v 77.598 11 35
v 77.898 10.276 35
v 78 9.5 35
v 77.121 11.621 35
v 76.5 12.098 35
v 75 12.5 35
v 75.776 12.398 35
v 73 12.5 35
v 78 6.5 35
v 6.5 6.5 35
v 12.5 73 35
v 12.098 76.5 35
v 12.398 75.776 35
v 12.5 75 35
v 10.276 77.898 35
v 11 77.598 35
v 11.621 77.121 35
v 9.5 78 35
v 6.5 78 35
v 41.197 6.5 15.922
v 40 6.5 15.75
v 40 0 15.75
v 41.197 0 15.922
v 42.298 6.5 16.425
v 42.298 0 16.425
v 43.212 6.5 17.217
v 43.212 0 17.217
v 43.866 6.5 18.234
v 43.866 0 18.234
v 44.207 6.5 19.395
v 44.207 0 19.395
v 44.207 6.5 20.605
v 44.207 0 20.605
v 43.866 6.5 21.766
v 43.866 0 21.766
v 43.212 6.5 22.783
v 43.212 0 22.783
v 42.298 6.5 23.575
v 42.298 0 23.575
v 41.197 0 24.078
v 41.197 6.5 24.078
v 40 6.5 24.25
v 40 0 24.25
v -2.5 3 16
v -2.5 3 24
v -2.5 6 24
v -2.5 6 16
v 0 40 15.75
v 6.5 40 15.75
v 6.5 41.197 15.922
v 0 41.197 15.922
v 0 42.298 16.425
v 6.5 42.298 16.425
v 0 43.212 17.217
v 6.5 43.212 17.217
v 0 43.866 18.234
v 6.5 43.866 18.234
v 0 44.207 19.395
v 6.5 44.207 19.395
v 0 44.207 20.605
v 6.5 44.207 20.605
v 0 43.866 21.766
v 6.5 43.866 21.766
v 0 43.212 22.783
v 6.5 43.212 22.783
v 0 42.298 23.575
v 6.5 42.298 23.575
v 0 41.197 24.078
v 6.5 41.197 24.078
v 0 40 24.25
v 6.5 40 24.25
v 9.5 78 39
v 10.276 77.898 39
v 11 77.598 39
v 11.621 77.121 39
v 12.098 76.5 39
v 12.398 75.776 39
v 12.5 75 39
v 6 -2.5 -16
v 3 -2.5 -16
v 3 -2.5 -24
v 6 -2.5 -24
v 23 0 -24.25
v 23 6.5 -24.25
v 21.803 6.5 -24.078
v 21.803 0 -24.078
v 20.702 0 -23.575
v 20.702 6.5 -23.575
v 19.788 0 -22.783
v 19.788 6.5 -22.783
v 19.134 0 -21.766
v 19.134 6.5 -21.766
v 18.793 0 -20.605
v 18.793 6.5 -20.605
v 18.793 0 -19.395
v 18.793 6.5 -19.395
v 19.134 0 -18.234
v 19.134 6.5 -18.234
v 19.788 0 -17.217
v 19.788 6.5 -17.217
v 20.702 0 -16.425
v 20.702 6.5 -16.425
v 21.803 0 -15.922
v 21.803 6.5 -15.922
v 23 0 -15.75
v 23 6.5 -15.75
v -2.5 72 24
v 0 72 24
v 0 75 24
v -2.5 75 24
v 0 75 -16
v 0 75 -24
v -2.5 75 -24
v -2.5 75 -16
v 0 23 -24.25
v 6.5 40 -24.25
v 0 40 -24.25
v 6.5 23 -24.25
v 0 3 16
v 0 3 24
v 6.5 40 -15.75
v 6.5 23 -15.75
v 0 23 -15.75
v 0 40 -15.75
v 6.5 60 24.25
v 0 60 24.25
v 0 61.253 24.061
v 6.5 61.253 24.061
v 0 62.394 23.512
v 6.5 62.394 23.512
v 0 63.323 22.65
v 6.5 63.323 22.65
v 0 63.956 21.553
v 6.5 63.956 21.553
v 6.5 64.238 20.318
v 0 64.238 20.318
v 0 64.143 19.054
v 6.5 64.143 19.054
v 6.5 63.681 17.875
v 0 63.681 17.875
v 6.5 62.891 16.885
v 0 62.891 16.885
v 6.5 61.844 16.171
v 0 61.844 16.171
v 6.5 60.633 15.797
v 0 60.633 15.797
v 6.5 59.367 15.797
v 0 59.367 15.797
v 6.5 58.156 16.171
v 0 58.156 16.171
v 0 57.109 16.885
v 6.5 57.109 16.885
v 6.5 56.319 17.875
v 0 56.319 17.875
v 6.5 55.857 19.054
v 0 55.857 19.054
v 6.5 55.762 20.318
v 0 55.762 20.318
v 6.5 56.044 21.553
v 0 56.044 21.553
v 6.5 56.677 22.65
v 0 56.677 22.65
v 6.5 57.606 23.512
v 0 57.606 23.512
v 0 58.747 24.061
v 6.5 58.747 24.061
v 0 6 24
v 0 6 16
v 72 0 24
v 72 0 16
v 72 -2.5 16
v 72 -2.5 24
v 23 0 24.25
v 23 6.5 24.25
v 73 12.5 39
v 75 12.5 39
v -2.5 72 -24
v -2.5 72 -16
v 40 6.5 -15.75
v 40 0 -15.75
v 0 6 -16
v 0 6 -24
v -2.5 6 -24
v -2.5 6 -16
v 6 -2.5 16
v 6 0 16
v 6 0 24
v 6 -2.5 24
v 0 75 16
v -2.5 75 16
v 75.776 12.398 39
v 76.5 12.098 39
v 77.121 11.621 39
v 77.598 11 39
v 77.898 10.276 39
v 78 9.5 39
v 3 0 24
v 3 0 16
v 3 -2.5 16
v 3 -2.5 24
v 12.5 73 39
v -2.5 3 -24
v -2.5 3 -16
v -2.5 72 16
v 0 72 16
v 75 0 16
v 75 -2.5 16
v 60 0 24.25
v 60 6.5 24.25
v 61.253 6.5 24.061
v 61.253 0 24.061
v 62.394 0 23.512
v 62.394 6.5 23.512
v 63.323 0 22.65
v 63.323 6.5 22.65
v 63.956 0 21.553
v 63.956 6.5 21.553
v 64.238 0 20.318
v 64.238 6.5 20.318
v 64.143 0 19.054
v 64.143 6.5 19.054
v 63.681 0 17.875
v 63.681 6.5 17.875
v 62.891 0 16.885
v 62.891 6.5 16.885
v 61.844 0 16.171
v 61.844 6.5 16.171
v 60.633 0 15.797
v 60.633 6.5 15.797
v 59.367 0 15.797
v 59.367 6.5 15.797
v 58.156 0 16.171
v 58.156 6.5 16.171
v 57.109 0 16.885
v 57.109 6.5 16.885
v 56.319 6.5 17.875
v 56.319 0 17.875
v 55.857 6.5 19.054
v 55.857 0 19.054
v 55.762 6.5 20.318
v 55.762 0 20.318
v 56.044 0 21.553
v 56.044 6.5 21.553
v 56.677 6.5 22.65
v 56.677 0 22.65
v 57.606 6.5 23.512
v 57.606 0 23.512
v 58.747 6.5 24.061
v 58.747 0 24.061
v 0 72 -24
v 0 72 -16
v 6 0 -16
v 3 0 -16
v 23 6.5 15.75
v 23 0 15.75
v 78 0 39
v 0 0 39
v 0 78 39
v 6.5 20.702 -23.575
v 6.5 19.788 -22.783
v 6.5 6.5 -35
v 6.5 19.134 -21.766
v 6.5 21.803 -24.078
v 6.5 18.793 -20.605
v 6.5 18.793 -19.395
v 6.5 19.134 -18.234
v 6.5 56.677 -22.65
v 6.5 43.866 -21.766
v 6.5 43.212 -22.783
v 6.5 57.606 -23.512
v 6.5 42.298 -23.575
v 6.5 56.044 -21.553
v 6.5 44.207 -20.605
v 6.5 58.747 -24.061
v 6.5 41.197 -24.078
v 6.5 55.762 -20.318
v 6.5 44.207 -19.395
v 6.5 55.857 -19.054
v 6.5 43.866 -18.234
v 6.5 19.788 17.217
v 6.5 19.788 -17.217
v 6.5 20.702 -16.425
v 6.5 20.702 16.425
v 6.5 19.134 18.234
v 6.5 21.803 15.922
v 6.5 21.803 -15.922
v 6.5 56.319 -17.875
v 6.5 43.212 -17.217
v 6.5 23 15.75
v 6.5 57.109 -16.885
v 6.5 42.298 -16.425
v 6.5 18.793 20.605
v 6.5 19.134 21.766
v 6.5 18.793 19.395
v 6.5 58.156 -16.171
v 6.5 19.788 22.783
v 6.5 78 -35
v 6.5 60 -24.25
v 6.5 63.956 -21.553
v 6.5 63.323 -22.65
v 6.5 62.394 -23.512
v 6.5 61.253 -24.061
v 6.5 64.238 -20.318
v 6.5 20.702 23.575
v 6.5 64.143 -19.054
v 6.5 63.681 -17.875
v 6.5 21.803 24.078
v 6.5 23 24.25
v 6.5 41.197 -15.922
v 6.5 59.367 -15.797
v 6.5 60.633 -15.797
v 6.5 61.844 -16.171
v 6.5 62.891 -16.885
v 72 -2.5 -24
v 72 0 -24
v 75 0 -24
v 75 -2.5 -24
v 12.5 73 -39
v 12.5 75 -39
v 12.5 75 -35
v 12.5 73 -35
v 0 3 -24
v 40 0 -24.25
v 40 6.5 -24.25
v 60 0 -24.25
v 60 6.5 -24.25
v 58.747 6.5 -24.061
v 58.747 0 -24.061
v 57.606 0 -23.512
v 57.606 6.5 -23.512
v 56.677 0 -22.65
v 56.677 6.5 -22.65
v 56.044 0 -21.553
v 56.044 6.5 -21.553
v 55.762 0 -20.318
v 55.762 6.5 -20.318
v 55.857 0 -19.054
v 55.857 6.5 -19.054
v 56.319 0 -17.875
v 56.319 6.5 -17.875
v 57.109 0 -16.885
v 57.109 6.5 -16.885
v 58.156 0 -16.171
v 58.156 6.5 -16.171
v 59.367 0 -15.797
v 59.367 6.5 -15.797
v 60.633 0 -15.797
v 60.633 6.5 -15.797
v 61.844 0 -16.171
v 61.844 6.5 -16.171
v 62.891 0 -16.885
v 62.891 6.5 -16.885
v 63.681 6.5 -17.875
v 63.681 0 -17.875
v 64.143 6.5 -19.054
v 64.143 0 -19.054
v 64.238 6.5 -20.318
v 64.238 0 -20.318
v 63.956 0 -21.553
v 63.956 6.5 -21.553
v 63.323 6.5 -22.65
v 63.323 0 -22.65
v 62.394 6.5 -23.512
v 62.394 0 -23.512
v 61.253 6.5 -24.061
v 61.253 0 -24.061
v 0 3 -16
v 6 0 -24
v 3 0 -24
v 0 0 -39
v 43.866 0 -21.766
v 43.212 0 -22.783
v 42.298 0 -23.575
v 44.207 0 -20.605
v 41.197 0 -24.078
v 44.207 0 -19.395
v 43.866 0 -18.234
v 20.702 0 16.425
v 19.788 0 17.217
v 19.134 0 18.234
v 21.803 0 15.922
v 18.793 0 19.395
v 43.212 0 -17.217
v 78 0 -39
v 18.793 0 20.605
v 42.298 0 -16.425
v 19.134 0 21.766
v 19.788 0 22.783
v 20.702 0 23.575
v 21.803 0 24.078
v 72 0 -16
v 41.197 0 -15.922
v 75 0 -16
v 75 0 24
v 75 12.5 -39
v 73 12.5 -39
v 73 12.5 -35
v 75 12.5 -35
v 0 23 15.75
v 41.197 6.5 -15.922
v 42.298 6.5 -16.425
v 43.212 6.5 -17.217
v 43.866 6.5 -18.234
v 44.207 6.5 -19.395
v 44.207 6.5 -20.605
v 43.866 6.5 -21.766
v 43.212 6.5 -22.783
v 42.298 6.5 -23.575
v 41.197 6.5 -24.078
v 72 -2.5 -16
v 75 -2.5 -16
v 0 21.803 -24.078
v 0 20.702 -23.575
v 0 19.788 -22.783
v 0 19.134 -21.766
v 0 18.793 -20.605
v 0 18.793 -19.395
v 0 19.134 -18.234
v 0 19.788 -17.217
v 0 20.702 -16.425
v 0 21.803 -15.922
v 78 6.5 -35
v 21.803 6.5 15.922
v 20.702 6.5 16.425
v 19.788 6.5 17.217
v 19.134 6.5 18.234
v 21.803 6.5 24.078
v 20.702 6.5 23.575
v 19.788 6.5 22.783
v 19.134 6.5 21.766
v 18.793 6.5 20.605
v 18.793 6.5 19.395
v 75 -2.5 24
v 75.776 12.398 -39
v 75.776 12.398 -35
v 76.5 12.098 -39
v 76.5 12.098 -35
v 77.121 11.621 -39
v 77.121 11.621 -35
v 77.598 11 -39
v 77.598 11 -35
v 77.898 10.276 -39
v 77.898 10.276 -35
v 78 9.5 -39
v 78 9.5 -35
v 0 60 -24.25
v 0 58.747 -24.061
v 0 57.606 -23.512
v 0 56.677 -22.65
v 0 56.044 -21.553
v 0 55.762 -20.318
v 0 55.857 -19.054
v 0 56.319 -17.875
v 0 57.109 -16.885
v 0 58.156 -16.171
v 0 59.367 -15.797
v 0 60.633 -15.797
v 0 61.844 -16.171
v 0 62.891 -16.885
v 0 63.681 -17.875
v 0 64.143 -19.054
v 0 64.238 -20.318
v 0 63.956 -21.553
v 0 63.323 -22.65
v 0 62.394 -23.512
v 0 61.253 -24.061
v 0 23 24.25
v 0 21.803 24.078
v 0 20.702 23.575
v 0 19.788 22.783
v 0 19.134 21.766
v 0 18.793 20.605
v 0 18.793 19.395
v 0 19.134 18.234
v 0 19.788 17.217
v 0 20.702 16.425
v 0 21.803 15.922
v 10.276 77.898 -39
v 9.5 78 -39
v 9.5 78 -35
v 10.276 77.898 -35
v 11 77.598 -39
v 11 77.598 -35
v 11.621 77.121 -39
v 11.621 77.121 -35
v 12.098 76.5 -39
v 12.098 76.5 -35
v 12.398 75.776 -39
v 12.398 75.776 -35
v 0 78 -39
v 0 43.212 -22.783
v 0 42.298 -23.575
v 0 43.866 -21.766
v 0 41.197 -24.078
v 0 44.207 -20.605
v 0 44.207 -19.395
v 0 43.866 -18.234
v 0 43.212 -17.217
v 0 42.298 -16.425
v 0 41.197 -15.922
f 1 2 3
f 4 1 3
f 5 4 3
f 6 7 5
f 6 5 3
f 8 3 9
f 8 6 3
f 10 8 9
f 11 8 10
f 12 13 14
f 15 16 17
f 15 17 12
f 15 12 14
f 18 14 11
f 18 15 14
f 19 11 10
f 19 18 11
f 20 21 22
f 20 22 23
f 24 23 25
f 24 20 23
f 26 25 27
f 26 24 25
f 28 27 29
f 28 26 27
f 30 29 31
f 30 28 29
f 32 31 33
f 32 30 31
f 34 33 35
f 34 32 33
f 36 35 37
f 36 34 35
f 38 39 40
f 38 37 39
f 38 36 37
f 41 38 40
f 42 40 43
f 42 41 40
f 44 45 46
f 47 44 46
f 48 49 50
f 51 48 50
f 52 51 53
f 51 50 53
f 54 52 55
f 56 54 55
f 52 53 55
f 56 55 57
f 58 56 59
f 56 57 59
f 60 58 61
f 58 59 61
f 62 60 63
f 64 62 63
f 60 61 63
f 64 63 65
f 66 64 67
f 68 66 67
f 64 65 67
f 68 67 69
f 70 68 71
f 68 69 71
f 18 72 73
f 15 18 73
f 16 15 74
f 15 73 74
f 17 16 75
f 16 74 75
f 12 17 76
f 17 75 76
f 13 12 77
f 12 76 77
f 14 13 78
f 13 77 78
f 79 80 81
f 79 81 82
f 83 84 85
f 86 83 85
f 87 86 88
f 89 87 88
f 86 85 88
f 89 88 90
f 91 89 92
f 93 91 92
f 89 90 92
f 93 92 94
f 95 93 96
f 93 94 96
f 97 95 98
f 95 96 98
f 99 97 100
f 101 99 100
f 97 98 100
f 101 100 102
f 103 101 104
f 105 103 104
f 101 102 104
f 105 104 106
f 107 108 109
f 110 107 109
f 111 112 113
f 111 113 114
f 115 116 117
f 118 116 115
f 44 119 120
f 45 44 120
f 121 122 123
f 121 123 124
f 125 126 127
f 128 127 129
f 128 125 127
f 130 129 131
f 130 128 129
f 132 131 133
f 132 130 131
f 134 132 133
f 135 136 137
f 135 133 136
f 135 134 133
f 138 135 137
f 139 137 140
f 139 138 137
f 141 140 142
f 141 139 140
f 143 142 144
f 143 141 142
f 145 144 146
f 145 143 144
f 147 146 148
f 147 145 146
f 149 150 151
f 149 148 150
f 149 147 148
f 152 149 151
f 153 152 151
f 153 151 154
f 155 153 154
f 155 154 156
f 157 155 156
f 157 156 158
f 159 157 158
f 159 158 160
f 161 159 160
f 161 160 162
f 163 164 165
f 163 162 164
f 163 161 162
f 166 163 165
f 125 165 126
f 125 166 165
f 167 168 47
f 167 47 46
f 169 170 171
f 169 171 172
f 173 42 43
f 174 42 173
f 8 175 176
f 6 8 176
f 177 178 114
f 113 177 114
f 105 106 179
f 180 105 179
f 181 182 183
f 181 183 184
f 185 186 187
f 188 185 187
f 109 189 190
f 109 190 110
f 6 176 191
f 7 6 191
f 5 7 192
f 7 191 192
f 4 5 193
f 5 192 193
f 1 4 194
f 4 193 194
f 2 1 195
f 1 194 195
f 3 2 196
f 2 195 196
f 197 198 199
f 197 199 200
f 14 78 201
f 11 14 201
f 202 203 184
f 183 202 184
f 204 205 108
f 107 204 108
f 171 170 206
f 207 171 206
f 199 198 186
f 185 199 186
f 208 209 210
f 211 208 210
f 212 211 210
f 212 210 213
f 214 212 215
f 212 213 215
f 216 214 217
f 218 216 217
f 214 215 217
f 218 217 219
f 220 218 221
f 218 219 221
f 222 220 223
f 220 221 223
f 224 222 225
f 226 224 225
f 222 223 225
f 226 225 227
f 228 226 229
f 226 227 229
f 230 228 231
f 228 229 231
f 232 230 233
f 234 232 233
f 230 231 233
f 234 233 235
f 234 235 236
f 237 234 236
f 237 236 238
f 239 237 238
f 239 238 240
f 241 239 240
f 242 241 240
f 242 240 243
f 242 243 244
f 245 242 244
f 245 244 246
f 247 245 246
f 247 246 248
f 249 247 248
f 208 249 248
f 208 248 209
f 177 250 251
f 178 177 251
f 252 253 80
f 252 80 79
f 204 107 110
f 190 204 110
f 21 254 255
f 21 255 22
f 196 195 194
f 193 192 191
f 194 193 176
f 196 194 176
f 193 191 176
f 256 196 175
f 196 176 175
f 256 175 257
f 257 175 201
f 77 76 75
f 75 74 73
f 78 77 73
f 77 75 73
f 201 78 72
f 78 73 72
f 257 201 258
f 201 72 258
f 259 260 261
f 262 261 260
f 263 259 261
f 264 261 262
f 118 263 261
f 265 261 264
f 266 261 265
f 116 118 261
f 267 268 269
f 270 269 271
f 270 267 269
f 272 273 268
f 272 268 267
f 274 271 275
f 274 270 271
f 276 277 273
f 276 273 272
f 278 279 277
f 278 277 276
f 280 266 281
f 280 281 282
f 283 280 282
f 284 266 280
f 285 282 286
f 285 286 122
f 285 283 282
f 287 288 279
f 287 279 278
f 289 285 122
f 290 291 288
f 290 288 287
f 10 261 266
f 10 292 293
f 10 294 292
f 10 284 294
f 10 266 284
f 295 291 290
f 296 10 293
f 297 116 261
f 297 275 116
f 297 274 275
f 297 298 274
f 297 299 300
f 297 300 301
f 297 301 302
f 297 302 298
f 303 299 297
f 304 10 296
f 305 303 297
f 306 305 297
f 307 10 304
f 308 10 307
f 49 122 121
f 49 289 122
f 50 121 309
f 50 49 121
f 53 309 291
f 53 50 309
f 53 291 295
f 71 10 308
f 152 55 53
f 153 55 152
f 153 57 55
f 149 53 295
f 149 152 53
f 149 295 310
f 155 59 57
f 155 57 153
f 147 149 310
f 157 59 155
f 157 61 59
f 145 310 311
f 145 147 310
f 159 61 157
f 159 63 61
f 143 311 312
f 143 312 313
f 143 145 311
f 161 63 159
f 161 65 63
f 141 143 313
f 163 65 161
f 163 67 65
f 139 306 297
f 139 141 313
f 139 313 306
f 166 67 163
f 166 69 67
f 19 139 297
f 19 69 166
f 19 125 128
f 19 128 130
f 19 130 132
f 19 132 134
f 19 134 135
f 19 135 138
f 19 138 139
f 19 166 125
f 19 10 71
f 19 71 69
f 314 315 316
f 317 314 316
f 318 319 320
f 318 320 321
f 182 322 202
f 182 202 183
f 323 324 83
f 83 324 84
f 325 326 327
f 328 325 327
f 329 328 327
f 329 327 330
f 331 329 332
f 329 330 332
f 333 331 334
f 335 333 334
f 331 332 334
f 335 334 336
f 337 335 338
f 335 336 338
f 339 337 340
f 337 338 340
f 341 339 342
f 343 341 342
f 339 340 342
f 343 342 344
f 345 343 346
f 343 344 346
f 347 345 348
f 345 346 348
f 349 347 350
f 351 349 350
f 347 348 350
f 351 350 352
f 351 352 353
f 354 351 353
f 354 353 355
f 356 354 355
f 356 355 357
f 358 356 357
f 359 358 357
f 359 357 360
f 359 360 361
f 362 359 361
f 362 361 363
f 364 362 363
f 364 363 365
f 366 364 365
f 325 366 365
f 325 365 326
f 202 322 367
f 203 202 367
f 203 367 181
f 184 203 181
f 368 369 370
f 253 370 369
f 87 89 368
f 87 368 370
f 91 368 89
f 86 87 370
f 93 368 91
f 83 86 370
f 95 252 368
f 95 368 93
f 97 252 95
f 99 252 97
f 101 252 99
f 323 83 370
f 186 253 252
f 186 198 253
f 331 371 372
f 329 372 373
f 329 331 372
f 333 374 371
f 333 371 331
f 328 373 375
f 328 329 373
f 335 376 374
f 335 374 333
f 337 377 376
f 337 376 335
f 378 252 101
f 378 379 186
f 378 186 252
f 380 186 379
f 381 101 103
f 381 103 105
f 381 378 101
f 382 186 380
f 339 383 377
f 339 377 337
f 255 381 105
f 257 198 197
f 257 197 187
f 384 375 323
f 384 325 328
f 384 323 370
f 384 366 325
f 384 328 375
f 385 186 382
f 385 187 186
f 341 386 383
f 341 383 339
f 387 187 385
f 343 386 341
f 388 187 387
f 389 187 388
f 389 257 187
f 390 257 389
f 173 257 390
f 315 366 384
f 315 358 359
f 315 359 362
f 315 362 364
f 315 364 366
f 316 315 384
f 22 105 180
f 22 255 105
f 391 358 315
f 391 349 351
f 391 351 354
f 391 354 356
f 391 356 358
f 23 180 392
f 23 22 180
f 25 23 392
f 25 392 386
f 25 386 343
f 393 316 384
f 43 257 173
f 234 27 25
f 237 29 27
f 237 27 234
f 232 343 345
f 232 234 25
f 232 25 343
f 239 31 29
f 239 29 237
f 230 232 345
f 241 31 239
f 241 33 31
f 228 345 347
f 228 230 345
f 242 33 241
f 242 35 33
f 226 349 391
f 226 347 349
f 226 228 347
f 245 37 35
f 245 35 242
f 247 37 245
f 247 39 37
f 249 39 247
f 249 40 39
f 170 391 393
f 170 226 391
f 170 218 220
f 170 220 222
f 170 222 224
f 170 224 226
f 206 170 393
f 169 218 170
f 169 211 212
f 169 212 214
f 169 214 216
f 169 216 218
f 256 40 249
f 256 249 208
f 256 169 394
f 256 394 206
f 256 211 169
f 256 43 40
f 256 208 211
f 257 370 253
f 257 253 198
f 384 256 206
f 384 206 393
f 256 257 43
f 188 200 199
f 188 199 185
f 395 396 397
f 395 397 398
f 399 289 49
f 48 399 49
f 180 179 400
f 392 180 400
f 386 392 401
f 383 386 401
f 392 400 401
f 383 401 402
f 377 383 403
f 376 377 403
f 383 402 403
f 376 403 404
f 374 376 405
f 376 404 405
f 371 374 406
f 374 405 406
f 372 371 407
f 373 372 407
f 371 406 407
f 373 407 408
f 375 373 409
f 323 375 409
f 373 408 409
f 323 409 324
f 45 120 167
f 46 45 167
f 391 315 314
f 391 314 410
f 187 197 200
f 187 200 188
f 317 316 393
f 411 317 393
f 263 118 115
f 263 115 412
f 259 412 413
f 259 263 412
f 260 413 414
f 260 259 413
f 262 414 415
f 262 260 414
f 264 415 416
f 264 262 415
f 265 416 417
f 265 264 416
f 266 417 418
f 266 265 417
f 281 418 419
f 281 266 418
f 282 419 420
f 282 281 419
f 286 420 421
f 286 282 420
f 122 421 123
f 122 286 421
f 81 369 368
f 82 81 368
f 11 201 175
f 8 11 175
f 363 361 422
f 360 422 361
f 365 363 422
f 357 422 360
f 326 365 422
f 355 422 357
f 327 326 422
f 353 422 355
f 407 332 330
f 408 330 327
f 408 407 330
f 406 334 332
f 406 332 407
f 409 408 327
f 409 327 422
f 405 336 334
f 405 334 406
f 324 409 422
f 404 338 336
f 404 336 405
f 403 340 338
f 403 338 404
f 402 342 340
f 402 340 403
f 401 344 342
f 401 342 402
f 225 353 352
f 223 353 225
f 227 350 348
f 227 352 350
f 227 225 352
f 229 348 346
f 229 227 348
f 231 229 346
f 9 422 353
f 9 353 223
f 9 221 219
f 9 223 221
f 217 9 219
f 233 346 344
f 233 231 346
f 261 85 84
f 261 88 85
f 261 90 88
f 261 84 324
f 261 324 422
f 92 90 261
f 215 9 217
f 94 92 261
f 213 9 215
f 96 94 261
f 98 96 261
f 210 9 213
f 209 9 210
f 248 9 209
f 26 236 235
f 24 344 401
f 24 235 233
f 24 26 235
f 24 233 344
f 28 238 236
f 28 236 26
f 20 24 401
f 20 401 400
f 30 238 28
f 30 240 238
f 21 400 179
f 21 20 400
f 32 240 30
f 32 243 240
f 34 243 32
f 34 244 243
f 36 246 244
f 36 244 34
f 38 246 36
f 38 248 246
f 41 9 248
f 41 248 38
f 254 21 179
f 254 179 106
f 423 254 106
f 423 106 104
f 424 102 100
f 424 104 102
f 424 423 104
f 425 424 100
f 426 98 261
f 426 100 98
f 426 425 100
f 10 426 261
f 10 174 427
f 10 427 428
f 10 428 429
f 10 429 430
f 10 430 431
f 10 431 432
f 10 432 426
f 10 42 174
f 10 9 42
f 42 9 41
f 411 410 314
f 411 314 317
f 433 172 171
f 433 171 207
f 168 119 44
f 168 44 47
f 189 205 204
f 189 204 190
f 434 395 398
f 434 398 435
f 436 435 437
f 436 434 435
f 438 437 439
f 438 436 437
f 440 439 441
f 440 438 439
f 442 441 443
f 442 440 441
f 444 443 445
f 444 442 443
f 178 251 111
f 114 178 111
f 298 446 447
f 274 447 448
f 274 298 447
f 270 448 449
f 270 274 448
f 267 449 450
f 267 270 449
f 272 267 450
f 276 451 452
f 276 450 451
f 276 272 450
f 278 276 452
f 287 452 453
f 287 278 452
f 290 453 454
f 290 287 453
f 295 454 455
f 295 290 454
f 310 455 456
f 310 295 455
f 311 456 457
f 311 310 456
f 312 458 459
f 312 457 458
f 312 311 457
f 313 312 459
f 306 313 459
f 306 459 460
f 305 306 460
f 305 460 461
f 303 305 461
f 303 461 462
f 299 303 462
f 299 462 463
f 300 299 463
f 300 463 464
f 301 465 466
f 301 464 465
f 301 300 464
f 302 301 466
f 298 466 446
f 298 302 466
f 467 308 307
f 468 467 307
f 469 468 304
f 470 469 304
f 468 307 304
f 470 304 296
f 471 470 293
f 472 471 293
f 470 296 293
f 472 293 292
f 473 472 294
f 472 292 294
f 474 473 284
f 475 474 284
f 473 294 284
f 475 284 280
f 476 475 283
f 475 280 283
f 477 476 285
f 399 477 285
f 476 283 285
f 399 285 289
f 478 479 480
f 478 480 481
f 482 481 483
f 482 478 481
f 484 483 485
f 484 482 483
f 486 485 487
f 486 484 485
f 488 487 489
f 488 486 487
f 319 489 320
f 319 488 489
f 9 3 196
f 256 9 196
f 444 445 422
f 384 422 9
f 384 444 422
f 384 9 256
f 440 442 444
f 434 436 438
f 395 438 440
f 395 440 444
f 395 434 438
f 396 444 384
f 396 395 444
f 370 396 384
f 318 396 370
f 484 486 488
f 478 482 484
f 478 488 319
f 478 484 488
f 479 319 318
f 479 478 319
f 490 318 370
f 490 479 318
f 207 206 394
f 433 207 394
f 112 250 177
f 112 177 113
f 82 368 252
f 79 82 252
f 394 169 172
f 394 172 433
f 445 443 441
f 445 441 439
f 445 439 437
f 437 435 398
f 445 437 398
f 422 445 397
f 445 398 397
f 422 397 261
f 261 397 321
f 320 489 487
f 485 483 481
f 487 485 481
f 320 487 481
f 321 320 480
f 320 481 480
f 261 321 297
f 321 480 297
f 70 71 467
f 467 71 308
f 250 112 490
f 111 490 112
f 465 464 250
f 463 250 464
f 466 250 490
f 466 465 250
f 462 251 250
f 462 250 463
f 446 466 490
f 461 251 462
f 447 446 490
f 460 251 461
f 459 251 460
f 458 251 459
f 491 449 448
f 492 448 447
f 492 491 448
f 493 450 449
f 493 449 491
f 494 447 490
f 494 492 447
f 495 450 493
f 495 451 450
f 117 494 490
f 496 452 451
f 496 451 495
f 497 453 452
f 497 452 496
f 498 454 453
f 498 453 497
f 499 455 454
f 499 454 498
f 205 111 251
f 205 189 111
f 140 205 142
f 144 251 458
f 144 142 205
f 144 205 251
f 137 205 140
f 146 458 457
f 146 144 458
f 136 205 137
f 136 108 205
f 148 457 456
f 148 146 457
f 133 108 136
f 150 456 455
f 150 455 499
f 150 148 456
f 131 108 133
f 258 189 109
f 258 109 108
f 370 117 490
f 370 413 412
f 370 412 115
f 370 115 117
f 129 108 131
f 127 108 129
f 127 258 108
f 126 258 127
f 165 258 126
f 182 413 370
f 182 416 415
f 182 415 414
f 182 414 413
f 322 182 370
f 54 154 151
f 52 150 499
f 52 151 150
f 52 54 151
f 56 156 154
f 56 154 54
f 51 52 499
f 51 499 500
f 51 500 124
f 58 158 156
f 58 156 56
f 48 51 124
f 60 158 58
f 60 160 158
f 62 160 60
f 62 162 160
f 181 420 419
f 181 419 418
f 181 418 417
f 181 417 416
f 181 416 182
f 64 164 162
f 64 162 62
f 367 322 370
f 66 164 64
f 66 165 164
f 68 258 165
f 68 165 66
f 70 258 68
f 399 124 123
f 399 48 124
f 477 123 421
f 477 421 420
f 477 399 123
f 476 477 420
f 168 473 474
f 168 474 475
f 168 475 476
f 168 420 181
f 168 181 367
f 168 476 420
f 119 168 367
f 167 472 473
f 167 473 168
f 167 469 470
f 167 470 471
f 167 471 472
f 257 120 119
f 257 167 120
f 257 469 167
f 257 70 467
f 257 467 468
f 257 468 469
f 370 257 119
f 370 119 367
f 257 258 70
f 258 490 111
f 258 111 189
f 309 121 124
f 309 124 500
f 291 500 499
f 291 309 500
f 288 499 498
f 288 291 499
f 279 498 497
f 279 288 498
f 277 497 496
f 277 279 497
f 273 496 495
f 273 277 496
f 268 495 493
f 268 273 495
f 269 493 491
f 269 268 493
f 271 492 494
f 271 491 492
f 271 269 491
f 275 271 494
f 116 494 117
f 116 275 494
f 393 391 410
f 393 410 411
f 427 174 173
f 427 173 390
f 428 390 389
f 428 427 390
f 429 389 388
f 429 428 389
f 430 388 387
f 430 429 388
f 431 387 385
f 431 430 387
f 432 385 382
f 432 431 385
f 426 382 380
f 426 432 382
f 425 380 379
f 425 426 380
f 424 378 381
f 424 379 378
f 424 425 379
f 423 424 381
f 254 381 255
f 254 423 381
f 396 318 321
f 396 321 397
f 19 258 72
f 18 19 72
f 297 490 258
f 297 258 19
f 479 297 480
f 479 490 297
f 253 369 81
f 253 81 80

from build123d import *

# Parameters (mm, degrees)
EXTRUDE_1_DEPTH     = 39
EXTRUDE_2_DEPTH     = 4
SKETCH_3_R          = 4.25
CUT_EXTRUDE_1_DEPTH = 7.5
SKETCH_4_W          = 3
SKETCH_4_H          = 8
EXTRUDE_3_DEPTH     = 2.5


with BuildPart() as part:
    # Эскиз1 → Бобышка-Вытянуть1 (new body, symmetric)
    with BuildSketch(Plane.XY):
        Polygon((0, 78), (0, 0), (78, 0), (78, 6.5), (6.5, 6.5), (6.5, 78), align=None)
    extrude(amount=EXTRUDE_1_DEPTH, both=True)

    # Эскиз2 → Бобышка-Вытянуть2 (add)
    with BuildSketch(Plane.XY.offset(39)):
        with BuildLine():
            Line((78, 6.5), (6.5, 6.5))
            Line((6.5, 6.5), (6.5, 78))
            Line((6.5, 78), (9.5, 78))
            ThreePointArc((9.5, 78), (11.621320344, 77.121320344), (12.5, 75))
            Line((12.5, 75), (12.5, 73))
            Line((12.5, 73), (73, 12.5))
            Line((73, 12.5), (75, 12.5))
            ThreePointArc((75, 12.5), (77.121320344, 11.621320344), (78, 9.5))
            Line((78, 9.5), (78, 6.5))
        make_face()
    extrude_2 = extrude(amount=-EXTRUDE_2_DEPTH)

    # Зеркальное отражение2: Бобышка-Вытянуть2 across plane
    add(extrude_2.mirror(Plane.XY))

    # Эскиз3 → Вырез-Вытянуть1 (cut, through all)
    with BuildSketch(Plane(origin=(0, 6.5, 0), x_dir=(1, 0, 0), z_dir=(0, 1, 0))):
        with Locations(Location((60, -20, 0), (0, 0, 270))):  # turned: the seam where the file's is
            Circle(SKETCH_3_R)
        with Locations(Location((60, 20, 0), (0, 0, 90))):  # turned: the seam where the file's is
            Circle(SKETCH_3_R)
        with BuildLine():
            Line((23, -15.75), (40, -15.75))
            ThreePointArc((40, -15.75), (44.25, -20), (40, -24.25))
            Line((40, -24.25), (23, -24.25))
            ThreePointArc((23, -24.25), (18.75, -20), (23, -15.75))
        make_face()
        with BuildLine():
            Line((23, 15.75), (40, 15.75))
            ThreePointArc((40, 15.75), (44.25, 20), (40, 24.25))
            Line((40, 24.25), (23, 24.25))
            ThreePointArc((23, 24.25), (18.75, 20), (23, 15.75))
        make_face()
    cut_extrude_1 = extrude(amount=-CUT_EXTRUDE_1_DEPTH, mode=Mode.SUBTRACT)

    # Эскиз4 → Бобышка-Вытянуть3 (add)
    with BuildSketch(Plane.XZ):
        with Locations((4.5, -20)):
            Rectangle(SKETCH_4_W, SKETCH_4_H)
        with Locations((73.5, -20)):
            Rectangle(SKETCH_4_W, SKETCH_4_H)
        with Locations((73.5, 20)):
            Rectangle(SKETCH_4_W, SKETCH_4_H)
        with Locations((4.5, 20)):
            Rectangle(SKETCH_4_W, SKETCH_4_H)
    extrude_3 = extrude(amount=EXTRUDE_3_DEPTH)

    # Зеркальное отражение3: Вырез-Вытянуть1, Бобышка-Вытянуть3 across plane
    add(cut_extrude_1.mirror(Plane(origin=(0, 0, 0), x_dir=(0, 0, 1), z_dir=(-0.707106781, 0.707106781, 0))), mode=Mode.SUBTRACT)
    add(extrude_3.mirror(Plane(origin=(0, 0, 0), x_dir=(0, 0, 1), z_dir=(-0.707106781, 0.707106781, 0))))


solid = part.part
